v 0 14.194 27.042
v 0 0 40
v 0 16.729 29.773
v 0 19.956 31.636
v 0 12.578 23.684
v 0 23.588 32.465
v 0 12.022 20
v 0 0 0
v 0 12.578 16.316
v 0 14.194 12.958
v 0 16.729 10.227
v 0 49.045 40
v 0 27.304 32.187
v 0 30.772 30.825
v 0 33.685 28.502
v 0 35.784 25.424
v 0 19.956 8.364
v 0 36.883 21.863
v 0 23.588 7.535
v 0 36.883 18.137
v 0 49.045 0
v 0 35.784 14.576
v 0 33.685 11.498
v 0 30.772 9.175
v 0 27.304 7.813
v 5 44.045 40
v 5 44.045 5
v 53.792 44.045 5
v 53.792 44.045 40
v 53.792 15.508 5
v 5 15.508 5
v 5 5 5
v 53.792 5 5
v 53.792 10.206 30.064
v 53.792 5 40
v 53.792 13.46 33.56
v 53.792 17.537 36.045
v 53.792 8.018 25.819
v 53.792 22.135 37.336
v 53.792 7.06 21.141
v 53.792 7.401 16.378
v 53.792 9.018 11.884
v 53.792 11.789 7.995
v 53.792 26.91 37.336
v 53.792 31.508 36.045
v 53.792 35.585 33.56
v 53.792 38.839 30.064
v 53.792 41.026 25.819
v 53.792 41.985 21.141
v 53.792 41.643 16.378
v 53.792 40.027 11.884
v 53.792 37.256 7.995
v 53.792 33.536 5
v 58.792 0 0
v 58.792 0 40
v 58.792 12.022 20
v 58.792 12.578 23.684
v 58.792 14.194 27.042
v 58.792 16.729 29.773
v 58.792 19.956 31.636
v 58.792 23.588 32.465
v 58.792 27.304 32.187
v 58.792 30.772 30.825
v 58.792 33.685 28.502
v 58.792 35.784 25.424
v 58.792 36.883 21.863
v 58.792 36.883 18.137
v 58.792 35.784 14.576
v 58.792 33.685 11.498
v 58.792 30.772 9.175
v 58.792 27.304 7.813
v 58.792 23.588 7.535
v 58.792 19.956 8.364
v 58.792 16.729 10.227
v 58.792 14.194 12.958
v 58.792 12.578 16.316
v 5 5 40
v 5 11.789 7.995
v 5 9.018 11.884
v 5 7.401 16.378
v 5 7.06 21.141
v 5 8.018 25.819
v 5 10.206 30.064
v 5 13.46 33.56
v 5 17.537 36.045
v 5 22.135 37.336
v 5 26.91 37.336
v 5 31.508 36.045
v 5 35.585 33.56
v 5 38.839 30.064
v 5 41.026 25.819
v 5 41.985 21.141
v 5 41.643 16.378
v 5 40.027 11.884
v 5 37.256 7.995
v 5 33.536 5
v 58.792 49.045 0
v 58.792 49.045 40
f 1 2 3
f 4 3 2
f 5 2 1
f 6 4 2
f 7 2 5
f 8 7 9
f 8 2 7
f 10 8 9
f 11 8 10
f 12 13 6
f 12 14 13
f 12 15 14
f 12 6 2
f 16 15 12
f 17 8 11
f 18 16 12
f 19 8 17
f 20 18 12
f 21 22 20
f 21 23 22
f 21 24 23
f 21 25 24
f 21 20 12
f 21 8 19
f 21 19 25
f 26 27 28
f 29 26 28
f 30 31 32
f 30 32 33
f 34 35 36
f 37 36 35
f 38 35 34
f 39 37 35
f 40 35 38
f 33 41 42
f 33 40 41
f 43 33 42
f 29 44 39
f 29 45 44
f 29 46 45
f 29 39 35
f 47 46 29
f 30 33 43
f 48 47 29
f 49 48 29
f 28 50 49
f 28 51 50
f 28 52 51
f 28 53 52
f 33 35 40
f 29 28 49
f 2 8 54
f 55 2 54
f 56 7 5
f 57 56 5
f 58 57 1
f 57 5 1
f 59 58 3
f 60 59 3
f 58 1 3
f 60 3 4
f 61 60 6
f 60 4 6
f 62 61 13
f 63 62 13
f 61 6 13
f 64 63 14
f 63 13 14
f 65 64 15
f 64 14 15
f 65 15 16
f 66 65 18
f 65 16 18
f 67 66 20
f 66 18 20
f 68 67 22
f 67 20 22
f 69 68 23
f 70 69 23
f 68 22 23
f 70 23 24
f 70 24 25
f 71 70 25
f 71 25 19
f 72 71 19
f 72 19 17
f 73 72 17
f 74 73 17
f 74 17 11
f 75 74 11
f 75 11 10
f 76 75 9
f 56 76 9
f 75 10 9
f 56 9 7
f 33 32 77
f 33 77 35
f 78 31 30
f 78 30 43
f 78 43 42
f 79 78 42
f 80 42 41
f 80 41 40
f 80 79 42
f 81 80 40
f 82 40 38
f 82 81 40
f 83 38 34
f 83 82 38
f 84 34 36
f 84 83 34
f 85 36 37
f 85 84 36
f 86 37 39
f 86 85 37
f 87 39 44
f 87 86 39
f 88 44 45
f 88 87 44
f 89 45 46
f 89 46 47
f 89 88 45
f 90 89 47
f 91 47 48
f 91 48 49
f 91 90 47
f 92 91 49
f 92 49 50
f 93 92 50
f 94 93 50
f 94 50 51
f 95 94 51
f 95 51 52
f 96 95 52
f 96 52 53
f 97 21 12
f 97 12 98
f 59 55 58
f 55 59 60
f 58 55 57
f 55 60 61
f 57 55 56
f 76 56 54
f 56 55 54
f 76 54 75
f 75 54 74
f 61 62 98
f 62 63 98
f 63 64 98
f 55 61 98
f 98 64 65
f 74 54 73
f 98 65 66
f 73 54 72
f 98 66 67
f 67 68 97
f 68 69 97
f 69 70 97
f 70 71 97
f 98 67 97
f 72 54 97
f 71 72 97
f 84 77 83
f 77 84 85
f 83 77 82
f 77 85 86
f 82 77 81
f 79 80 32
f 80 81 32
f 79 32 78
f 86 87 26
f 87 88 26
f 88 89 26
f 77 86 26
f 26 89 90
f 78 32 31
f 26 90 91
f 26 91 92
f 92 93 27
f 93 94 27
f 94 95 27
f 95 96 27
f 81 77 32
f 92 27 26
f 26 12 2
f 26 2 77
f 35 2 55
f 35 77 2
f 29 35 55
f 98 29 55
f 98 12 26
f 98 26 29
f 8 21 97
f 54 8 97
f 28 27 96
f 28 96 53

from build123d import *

# Parameters (mm, degrees)
F0_W     = 58.7917491794
F0_H     = 49.0446984768
F1_DEPTH = 40
F2_R     = 12.5
F3_DEPTH = 58.7917491794
F4_T     = -5


with BuildPart() as f1:
    # F0 (on Top) → F1 (new body)
    with BuildSketch(Plane.XY):
        with Locations((29.3958745897, 24.5223492384)):
            Rectangle(F0_W, F0_H)
    extrude(amount=F1_DEPTH)

    # F2 (on face) → F3 (cut, through all)
    with BuildSketch(Plane(origin=(0, 0, 0), x_dir=(0, -1, 0), z_dir=(-1, 0, 0))):
        with Locations((-24.5223492384, 20)):
            Circle(F2_R)
    extrude(amount=-F3_DEPTH, mode=Mode.SUBTRACT)

    # F4
    f4_openings = [f1.faces().sort_by_distance(p)[0] for p in [
        (29.395875, 24.522349, 40),
    ]]
    offset(amount=F4_T, openings=f4_openings, kind=Kind.INTERSECTION)


solid = f1.part
